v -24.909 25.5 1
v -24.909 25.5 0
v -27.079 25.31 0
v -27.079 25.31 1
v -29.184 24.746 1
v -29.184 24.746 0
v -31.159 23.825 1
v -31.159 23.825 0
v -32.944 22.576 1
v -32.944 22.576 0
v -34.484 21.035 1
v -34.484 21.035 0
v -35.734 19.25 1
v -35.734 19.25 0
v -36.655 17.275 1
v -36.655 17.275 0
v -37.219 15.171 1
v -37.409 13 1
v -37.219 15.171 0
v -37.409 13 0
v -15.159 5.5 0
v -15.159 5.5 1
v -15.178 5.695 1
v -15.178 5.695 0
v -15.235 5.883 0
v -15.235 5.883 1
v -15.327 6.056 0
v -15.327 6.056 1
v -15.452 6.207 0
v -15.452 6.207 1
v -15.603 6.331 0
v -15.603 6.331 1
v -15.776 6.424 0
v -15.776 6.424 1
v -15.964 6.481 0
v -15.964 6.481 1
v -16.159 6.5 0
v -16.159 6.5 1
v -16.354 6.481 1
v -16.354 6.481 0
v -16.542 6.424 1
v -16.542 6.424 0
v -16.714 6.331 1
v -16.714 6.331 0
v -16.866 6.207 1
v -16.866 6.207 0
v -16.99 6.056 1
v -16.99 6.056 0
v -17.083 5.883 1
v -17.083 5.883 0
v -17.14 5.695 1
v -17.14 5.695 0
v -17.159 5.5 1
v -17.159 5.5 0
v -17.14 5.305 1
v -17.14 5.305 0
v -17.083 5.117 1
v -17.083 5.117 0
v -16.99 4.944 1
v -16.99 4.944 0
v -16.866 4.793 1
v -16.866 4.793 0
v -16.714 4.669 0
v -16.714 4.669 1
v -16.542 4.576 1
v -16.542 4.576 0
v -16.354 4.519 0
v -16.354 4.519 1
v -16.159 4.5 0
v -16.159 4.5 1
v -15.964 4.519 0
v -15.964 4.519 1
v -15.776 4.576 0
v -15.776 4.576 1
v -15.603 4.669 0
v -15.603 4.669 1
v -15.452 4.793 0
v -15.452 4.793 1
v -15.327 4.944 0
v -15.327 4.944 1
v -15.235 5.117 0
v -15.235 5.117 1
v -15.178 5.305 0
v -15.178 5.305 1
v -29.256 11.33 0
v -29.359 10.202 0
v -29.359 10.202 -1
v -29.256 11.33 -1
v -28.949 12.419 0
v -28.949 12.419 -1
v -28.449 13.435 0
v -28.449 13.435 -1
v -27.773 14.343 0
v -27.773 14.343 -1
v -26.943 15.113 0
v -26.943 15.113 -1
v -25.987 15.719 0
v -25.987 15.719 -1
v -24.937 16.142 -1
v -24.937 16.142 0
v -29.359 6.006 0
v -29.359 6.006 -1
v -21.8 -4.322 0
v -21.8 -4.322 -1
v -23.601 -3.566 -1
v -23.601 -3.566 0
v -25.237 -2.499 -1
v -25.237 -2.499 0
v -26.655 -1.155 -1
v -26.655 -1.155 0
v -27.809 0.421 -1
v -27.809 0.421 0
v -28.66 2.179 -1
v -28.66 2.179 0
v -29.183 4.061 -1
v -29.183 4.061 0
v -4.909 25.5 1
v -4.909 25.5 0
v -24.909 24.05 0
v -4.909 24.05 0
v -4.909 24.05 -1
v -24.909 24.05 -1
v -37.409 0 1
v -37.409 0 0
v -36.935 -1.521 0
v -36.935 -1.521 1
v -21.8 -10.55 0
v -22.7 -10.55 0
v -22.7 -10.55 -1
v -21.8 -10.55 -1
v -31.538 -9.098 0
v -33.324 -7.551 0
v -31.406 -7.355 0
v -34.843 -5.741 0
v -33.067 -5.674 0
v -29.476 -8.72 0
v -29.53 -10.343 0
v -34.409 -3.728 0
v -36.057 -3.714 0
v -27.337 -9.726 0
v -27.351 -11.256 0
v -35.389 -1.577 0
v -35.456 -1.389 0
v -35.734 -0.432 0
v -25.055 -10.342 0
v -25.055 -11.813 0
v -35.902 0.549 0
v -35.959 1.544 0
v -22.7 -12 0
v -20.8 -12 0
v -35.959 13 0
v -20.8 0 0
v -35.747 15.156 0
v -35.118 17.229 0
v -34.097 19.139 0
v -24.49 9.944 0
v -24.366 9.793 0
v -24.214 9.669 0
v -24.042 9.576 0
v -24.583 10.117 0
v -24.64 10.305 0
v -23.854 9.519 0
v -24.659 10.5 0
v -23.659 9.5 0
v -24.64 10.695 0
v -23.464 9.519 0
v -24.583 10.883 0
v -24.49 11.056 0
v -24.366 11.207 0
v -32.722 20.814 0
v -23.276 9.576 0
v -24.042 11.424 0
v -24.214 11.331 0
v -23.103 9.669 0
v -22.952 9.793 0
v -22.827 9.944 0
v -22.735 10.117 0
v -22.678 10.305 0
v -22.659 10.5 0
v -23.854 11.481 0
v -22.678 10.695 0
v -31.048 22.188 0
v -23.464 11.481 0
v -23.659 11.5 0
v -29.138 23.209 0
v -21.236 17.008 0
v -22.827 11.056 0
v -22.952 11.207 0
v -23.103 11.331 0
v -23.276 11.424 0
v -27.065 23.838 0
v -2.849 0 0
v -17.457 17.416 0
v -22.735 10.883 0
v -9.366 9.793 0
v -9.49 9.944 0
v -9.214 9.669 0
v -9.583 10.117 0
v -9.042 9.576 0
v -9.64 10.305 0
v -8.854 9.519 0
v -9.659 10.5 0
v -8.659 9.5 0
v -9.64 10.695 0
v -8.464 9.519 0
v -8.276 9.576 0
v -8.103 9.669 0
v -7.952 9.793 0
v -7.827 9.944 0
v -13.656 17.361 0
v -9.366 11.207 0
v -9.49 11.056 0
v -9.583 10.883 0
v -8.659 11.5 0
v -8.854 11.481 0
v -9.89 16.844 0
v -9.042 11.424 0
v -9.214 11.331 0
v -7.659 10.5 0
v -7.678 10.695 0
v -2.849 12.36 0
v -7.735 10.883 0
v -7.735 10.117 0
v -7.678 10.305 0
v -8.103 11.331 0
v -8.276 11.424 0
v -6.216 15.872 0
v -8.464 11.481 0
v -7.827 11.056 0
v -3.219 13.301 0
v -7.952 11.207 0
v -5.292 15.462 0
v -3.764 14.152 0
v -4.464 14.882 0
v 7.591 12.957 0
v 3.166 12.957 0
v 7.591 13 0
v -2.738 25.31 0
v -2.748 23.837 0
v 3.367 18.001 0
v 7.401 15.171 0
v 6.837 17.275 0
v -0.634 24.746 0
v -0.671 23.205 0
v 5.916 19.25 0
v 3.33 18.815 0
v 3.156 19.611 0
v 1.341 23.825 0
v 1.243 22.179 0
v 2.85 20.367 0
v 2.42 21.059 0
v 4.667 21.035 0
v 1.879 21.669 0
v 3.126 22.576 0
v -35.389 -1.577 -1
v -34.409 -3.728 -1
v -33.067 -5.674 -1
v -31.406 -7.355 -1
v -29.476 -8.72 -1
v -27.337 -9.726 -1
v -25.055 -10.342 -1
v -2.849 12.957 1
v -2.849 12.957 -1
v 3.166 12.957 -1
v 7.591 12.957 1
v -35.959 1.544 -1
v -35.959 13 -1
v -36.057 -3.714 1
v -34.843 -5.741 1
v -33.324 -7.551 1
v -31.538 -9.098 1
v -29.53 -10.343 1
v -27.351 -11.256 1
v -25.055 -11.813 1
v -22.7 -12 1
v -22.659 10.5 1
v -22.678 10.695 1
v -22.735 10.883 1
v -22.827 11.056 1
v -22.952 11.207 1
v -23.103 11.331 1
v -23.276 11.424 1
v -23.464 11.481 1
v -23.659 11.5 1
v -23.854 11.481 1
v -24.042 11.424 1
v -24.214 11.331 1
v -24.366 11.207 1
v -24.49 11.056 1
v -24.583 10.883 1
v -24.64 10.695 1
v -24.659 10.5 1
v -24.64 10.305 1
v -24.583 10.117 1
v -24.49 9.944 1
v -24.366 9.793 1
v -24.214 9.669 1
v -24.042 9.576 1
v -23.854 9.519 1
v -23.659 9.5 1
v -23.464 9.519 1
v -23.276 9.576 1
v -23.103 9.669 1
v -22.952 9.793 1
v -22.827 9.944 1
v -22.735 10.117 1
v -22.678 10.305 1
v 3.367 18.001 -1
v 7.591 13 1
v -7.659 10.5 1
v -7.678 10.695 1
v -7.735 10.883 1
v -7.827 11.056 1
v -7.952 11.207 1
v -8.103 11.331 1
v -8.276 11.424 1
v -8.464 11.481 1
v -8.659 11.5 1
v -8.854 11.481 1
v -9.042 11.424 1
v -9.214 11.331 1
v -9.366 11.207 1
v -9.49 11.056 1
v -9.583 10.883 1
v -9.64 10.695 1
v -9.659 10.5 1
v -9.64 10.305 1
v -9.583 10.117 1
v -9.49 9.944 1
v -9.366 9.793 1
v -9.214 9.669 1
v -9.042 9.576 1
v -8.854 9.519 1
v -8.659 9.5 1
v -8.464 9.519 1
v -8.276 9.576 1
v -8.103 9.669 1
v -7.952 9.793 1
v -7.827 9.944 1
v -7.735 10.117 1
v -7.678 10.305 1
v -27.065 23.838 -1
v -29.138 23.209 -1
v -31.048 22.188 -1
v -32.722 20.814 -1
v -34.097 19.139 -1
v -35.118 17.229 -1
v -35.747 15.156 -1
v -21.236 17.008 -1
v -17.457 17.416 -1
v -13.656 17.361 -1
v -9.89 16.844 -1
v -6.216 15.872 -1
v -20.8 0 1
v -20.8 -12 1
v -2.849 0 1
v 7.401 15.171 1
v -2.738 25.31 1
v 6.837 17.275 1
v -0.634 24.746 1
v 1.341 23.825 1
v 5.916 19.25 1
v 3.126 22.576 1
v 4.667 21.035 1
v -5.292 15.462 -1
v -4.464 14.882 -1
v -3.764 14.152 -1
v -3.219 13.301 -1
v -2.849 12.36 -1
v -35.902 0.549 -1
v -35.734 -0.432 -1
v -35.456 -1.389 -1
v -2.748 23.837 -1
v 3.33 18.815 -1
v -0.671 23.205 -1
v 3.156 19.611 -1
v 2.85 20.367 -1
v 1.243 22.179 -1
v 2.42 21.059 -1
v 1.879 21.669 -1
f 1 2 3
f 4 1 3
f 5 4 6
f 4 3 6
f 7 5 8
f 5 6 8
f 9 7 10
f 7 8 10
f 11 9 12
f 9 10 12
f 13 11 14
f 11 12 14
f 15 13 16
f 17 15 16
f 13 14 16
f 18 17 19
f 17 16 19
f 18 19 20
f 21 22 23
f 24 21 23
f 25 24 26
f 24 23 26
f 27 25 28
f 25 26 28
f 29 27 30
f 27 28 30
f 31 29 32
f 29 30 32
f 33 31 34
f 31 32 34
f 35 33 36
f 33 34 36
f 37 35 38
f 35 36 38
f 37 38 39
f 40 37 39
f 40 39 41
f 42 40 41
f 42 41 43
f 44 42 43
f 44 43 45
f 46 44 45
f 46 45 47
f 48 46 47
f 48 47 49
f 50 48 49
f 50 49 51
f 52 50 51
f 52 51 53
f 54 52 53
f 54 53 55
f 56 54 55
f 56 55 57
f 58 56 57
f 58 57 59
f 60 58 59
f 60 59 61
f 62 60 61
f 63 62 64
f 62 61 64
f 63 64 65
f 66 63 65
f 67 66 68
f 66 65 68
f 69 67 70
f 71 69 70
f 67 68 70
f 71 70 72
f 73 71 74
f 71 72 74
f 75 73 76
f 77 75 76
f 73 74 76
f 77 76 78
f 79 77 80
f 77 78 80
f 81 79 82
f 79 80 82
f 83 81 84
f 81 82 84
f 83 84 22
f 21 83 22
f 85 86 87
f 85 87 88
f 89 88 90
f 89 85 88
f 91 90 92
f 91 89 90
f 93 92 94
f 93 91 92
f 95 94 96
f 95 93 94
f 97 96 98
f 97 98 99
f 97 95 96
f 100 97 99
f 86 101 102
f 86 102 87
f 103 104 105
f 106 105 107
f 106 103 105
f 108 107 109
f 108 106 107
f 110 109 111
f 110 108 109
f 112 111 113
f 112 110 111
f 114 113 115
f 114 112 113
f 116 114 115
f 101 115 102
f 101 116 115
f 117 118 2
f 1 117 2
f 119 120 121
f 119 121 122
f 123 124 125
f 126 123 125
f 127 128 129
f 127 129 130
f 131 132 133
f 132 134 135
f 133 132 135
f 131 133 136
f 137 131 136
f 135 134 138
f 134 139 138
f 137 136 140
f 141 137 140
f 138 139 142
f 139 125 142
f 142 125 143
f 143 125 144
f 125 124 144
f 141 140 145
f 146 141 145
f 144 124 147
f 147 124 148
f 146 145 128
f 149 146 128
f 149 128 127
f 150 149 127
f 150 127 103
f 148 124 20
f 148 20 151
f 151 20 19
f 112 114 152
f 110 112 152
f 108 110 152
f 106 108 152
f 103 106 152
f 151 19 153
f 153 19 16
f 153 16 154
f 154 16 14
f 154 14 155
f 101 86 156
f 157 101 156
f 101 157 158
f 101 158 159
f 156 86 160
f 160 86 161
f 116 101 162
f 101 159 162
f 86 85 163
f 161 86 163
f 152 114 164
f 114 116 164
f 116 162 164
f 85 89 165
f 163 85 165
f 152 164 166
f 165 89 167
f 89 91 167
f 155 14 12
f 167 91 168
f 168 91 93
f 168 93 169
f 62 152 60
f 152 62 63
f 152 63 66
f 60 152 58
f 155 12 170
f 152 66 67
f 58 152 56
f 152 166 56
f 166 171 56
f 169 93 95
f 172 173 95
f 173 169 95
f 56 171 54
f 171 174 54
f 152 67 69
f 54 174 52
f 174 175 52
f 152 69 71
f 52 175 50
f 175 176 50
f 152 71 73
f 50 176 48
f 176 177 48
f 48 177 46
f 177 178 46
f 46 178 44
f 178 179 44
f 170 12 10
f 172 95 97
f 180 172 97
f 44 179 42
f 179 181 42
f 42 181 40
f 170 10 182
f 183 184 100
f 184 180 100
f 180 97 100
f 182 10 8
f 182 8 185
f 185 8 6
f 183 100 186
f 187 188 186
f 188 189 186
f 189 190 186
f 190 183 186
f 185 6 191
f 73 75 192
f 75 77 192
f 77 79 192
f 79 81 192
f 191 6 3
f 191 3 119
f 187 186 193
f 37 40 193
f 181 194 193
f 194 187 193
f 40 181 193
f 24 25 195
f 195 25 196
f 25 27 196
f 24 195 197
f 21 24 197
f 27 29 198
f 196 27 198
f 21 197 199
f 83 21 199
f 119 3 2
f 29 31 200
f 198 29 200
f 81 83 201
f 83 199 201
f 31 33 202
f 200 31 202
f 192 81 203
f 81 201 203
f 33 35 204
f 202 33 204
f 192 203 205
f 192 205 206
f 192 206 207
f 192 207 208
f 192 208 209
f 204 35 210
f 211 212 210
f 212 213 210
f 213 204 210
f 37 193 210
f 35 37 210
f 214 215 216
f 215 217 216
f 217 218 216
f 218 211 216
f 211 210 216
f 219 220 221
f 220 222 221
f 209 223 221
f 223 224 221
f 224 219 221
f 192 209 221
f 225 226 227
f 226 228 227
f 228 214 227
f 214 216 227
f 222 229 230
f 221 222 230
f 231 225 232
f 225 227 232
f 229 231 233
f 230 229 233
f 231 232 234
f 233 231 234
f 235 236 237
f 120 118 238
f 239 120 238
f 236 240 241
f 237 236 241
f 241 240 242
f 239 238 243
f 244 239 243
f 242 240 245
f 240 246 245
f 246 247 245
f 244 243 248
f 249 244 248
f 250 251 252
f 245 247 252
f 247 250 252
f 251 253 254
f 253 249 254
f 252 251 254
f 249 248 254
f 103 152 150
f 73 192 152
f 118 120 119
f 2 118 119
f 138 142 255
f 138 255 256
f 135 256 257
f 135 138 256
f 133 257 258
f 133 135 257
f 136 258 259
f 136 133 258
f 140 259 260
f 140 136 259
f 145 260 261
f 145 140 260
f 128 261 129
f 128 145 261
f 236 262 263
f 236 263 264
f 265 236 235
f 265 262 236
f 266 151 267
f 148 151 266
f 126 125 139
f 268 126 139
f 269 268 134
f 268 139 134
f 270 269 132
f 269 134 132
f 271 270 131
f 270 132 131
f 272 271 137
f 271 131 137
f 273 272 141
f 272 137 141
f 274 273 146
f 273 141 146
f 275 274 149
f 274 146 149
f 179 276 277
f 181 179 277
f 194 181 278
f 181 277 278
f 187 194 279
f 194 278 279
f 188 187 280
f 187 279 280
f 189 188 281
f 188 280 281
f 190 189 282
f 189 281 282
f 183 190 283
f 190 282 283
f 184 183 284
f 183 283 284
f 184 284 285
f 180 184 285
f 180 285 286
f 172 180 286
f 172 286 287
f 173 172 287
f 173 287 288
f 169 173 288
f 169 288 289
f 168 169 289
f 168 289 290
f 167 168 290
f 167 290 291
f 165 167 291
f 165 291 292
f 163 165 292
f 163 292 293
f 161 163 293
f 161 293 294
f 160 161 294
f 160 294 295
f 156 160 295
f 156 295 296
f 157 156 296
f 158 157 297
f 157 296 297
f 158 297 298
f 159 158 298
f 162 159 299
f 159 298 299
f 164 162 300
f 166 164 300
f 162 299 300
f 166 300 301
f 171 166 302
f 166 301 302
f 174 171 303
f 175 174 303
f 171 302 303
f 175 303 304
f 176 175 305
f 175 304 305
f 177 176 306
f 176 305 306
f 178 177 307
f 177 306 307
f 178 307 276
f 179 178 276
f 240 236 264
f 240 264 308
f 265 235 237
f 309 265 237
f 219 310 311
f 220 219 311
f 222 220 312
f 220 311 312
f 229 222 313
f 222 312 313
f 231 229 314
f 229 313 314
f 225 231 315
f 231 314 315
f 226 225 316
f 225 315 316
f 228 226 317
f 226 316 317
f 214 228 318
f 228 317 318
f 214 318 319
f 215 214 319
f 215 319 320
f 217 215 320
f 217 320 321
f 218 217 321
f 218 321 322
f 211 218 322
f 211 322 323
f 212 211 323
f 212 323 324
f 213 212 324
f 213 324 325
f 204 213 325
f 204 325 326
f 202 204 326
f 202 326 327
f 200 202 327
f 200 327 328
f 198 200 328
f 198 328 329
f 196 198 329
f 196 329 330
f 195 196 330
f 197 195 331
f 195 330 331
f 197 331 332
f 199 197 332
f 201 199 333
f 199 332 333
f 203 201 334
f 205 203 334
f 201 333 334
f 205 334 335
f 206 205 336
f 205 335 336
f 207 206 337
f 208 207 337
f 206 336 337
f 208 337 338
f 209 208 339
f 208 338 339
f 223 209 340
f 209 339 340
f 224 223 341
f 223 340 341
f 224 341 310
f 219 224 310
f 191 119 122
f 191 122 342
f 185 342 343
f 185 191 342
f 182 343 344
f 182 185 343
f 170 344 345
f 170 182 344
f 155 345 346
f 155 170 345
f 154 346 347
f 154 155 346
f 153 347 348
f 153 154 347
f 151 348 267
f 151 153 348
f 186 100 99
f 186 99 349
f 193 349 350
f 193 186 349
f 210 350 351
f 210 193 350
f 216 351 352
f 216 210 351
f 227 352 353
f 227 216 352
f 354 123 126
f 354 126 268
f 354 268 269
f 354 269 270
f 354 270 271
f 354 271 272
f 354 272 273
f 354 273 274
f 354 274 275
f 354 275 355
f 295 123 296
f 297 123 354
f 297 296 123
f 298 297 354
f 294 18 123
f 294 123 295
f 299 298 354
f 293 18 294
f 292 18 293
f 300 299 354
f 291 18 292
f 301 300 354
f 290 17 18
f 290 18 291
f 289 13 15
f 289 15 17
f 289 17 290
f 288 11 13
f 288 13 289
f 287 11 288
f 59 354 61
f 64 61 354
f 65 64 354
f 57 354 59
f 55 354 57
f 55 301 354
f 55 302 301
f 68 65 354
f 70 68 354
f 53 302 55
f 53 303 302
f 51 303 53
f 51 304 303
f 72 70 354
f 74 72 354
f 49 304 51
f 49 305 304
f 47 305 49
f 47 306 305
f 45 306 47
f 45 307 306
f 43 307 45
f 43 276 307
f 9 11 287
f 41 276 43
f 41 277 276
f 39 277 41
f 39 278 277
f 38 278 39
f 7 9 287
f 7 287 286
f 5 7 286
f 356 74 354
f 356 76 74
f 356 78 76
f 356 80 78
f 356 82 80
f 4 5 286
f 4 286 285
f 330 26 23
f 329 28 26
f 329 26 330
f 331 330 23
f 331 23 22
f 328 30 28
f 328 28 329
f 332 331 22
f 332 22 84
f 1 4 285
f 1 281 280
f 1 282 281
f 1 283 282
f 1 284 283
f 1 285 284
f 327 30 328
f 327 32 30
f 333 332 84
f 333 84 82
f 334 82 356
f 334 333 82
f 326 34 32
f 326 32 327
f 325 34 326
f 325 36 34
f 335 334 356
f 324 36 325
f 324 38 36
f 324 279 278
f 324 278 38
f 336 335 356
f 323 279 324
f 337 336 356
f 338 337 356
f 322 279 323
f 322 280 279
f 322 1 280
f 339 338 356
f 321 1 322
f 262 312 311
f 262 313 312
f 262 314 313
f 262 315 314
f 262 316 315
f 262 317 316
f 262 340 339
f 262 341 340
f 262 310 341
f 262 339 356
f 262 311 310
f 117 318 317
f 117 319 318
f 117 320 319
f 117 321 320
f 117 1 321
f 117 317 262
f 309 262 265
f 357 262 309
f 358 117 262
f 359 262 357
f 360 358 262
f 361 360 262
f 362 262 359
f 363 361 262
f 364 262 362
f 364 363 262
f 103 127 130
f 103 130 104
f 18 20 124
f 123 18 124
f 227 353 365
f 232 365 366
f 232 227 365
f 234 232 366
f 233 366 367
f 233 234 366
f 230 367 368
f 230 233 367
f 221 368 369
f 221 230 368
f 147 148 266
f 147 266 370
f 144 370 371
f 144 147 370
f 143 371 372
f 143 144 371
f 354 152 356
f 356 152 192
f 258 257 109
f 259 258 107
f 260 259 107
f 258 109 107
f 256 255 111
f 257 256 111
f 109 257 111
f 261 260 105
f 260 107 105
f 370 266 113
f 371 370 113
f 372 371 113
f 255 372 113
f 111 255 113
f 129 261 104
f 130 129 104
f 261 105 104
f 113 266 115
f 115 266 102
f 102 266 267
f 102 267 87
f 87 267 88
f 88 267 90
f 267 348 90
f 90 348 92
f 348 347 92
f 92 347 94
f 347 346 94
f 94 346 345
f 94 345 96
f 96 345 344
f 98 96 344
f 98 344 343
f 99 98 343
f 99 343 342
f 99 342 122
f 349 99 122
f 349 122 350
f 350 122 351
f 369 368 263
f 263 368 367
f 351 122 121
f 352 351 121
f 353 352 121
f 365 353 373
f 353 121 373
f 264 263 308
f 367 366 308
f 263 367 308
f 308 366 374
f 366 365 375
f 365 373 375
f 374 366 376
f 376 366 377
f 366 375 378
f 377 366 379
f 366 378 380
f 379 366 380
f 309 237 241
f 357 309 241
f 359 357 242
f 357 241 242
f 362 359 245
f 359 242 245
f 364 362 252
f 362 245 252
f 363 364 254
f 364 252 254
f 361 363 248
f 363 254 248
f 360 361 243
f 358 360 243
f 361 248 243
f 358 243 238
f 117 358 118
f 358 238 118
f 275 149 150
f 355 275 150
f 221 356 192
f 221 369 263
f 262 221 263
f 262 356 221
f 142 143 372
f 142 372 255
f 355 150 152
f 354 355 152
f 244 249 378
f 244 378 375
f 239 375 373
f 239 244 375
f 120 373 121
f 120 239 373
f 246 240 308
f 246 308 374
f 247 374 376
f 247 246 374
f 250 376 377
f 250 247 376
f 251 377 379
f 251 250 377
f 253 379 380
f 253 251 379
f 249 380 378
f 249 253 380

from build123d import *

# Parameters (mm, degrees)
BOSS_EXTRUDE1_DEPTH = 1
SKETCH2_R           = 1
CUT_EXTRUDE1_DEPTH  = 2
BOSS_EXTRUDE3_DEPTH = 2


with BuildPart() as part:
    # Sketch1 → Boss-Extrude1 (new body)
    with BuildSketch(Plane.XY):
        with BuildLine():
            Line((-37.408874503, 0), (-36.935496874, -1.52115571))
            ThreePointArc((-36.935496874, -1.52115571), (-31.538206109, -9.097817453), (-22.7, -12))
            Line((-22.7, -12), (-20.8, -12))
            Line((-20.8, -12), (-20.8, 0))
            Line((-20.8, 0), (-2.848874503, 0))
            Line((-2.848874503, 0), (-2.848874503, 12.956751258))
            Line((-2.848874503, 12.956751258), (6.330544431, 12.956751258))
            Line((6.330544431, 12.956751258), (7.591125497, 12.956751258))
            Line((7.591125497, 12.956751258), (7.591125497, 13))
            ThreePointArc((7.591125497, 13), (3.929960262, 21.838834765), (-4.908874503, 25.5))
            Line((-4.908874503, 25.5), (-24.908874503, 25.5))
            ThreePointArc((-24.908874503, 25.5), (-33.747709268, 21.838834765), (-37.408874503, 13))
            Line((-37.408874503, 13), (-37.408874503, 0))
        make_face()
    extrude(amount=BOSS_EXTRUDE1_DEPTH)

    # Sketch2 → Cut-Extrude1 (cut, through all)
    with BuildSketch(Plane.XY.offset(1)):
        with Locations((-8.658874503, 10.5)):
            Circle(SKETCH2_R)
        with Locations((-23.658874503, 10.5)):
            Circle(SKETCH2_R)
        with Locations((-16.158874503, 5.5)):
            Circle(SKETCH2_R)
    extrude(amount=-CUT_EXTRUDE1_DEPTH, mode=Mode.SUBTRACT)

    # Sketch8 → Boss-Extrude3 (add)
    with BuildSketch(Plane.XY.offset(1)):
        with BuildLine():
            Line((-2.848874503, 12.956751258), (3.166072925, 12.956751258))
            Line((3.166072925, 12.956751258), (3.367034903, 18.000639192))
            ThreePointArc((3.367034903, 18.000639192), (2.849823018, 20.366659135), (1.243261137, 22.178982899))
            ThreePointArc((1.243261137, 22.178982899), (-1.693696517, 23.571902881), (-4.908874503, 24.05))
            Line((-4.908874503, 24.05), (-24.908874503, 24.05))
            ThreePointArc((-24.908874503, 24.05), (-32.722404435, 20.813529932), (-35.958874503, 13))
            Line((-35.958874503, 13), (-35.958874503, 1.543887245))
            ThreePointArc((-35.958874503, 1.543887245), (-35.832184971, 0.056041311), (-35.455764157, -1.388964962))
            Line((-35.455764157, -1.388964962), (-35.389408707, -1.576681154))
            ThreePointArc((-35.389408707, -1.576681154), (-30.47080344, -8.080025204), (-22.7, -10.55))
            Line((-22.7, -10.55), (-21.8, -10.55))
            Line((-21.8, -10.55), (-21.8, -4.322233026))
            ThreePointArc((-21.8, -4.322233026), (-27.267294325, -0.393232372), (-29.358874503, 6.006271182))
            Line((-29.358874503, 6.006271182), (-29.358874503, 10.202170558))
            ThreePointArc((-29.358874503, 10.202170558), (-28.131966709, 13.904649986), (-24.936824853, 16.141774295))
            ThreePointArc((-24.936824853, 16.141774295), (-15.555605997, 17.446766156), (-6.215886942, 15.87199031))
            ThreePointArc((-6.215886942, 15.87199031), (-4.096264622, 14.53396256), (-2.848874503, 12.359765022))
            Line((-2.848874503, 12.359765022), (-2.848874503, 12.956751258))
        make_face()
    extrude(amount=-BOSS_EXTRUDE3_DEPTH)


solid = part.part
